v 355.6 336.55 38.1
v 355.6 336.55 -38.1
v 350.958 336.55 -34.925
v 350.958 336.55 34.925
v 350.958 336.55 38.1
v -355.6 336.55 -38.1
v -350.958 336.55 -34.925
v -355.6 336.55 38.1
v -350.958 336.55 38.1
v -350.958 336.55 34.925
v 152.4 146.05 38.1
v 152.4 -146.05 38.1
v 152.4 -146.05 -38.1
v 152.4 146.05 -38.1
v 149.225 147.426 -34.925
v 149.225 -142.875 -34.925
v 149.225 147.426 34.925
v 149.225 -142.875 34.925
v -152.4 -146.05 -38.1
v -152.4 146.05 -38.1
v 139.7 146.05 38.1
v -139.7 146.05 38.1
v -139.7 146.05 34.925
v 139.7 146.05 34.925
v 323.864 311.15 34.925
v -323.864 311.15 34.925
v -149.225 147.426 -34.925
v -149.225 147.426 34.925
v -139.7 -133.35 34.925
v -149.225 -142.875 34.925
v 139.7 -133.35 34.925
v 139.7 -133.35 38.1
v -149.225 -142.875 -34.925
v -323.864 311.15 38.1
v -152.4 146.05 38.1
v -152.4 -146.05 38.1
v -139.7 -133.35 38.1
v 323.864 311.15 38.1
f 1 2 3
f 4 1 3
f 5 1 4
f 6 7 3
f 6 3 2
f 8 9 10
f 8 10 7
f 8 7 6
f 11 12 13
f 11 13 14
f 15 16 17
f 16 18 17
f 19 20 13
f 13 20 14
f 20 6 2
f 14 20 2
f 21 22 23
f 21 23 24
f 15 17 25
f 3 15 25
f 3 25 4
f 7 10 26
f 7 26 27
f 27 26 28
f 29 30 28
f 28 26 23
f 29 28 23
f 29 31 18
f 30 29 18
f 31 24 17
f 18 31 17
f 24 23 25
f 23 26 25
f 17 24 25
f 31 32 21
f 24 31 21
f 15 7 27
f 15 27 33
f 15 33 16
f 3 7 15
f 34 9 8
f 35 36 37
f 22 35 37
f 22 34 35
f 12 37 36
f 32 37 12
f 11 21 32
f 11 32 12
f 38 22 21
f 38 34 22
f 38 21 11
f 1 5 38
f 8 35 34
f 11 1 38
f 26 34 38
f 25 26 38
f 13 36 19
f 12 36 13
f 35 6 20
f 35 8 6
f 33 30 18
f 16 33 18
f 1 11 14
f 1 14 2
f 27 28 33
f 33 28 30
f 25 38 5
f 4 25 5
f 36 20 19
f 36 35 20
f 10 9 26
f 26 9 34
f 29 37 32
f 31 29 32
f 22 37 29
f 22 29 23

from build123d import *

# Parameters (mm, degrees)
BOSS_EXTRUDE1_DEPTH = 38.1
SHELL2_T            = -3.175
SKETCH2_W           = 279.4
SKETCH2_H           = 279.4
CUT_EXTRUDE1_DEPTH  = 73.025


with BuildPart() as part:
    # Sketch1 → Boss-Extrude1 (new body, symmetric)
    with BuildSketch(Plane.XY):
        Polygon((-152.4, 146.05), (-152.4, -146.05), (152.4, -146.05), (152.4, 146.05), (355.6, 336.55), (-355.6, 336.55), align=None)
    extrude(amount=BOSS_EXTRUDE1_DEPTH, both=True)

    # Shell2
    shell2_openings = [part.faces().sort_by_distance(p)[0] for p in [
        (0, 336.55, 0),
    ]]
    offset(amount=SHELL2_T, openings=shell2_openings, kind=Kind.INTERSECTION)

    # Sketch2 → Cut-Extrude1 (cut)
    with BuildSketch(Plane.XY.offset(38.1)):
        with Locations((0, 6.35)):
            Rectangle(SKETCH2_W, SKETCH2_H)
        Polygon((-350.957787584, 336.55), (-323.864454251, 311.15), (323.864454251, 311.15), (350.957787584, 336.55), align=None)
    extrude(amount=-CUT_EXTRUDE1_DEPTH, mode=Mode.SUBTRACT)


solid = part.part
